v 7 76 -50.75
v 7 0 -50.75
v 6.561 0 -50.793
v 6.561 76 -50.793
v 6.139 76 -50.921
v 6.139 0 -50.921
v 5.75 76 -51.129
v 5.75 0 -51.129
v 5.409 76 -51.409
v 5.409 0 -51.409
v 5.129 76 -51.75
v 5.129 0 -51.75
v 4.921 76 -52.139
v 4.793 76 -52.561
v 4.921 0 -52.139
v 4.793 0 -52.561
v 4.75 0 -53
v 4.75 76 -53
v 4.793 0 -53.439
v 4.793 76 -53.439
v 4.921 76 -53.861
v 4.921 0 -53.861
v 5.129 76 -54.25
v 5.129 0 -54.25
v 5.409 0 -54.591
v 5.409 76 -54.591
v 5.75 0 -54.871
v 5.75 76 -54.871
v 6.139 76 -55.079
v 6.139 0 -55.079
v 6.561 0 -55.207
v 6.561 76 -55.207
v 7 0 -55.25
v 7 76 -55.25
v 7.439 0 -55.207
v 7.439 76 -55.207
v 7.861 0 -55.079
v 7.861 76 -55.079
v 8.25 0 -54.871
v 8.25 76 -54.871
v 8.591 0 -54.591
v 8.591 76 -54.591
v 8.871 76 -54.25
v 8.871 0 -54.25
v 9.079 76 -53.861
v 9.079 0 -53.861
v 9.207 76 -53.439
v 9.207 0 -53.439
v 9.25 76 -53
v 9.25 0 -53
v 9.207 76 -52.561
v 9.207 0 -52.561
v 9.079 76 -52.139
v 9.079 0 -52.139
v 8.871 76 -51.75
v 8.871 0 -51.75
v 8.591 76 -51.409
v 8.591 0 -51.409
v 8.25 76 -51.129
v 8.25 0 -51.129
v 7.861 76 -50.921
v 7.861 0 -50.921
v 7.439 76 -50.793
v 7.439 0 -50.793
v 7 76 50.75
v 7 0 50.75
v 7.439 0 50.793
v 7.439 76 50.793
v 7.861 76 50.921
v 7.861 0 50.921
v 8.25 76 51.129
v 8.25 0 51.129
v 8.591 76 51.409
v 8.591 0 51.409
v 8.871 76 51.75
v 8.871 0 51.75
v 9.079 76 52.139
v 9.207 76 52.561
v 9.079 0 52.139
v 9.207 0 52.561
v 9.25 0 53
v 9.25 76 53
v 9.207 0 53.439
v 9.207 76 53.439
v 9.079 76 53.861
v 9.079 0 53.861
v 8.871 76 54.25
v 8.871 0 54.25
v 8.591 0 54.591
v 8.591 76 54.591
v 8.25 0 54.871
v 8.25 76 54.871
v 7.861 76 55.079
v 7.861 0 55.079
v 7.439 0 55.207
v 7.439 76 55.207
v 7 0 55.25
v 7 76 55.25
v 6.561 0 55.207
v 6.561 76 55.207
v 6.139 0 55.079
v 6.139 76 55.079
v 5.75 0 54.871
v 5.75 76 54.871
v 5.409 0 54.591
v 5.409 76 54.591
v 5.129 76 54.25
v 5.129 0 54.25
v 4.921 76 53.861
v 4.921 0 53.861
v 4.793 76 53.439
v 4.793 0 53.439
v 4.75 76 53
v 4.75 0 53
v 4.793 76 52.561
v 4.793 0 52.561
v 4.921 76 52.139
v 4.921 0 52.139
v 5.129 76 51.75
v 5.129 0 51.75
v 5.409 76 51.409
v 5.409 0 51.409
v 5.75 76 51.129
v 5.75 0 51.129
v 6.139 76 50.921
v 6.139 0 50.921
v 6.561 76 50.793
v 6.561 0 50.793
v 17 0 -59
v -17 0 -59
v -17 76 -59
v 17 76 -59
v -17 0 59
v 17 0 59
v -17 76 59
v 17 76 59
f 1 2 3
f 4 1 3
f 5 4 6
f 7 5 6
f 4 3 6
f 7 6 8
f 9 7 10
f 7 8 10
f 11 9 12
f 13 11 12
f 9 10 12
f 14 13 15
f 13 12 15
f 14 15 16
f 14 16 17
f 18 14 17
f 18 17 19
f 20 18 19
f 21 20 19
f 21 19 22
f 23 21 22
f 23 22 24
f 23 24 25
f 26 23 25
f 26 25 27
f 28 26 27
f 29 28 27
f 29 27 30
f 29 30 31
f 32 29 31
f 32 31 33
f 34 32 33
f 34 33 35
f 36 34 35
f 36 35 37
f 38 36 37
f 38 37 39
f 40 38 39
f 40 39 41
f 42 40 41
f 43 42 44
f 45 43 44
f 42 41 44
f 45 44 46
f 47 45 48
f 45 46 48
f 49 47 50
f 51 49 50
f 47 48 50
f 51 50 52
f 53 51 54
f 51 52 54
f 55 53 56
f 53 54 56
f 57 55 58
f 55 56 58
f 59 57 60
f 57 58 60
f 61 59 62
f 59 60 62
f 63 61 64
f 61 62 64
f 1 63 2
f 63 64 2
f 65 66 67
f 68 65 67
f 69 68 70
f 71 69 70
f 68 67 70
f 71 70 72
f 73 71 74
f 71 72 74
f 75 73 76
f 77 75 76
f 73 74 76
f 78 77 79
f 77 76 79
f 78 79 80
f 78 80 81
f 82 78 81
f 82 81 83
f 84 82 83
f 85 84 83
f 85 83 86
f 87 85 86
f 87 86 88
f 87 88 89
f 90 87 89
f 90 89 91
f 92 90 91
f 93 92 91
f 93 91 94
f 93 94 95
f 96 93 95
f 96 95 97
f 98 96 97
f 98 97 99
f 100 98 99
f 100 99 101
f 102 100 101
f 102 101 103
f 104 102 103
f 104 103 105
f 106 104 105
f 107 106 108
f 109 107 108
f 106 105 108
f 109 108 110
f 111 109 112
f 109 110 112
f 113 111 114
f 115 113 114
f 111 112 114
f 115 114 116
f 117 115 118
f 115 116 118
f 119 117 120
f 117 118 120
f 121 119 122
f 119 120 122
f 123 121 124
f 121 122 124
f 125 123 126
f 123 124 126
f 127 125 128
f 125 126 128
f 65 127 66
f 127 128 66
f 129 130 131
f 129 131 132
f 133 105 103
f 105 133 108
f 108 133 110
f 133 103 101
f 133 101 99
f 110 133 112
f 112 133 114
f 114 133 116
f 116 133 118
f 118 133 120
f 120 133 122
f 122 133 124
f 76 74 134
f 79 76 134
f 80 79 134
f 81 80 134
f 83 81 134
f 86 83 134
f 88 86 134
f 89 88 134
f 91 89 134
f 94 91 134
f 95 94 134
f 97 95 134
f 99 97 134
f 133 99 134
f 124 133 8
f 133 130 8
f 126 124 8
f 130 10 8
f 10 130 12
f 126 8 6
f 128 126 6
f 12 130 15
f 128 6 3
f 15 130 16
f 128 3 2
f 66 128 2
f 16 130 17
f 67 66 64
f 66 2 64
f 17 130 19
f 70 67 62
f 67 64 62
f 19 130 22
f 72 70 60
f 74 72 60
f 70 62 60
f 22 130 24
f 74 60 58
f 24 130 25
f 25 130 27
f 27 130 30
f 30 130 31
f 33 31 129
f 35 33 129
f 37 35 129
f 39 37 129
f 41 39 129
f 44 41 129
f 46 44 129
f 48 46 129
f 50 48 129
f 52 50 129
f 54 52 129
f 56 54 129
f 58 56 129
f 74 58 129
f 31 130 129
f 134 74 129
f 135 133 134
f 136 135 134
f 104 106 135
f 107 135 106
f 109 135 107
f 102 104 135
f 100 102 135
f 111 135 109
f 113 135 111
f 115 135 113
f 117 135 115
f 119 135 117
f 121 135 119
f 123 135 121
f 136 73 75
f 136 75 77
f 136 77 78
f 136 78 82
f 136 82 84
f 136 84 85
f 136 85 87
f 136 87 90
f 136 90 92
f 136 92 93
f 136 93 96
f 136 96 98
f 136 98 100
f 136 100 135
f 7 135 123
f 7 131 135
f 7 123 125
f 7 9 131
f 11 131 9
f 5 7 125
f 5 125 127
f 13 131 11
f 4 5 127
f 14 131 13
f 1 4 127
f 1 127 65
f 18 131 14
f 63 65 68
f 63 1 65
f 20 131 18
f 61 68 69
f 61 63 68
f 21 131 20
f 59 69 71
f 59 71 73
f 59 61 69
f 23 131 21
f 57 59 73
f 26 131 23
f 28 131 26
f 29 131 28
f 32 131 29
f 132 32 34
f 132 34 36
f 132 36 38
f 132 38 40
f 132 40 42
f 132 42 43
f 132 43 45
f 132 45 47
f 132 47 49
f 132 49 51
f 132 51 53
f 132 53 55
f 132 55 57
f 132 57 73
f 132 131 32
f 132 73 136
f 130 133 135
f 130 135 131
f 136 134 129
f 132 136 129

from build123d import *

# Parameters (mm, degrees)
SKETCH_1_W          = 34
SKETCH_1_H          = 118
EXTRUDE_1_DEPTH     = 76
SKETCH_2_R          = 2.25
CUT_EXTRUDE_1_DEPTH = 98.703633505


with BuildPart() as part:
    # 草图1 → 凸台-拉伸1 (new body)
    with BuildSketch(Plane(origin=(0, 0, 0), x_dir=(1, 0, 0), z_dir=(0, 1, 0))):
        Rectangle(SKETCH_1_W, SKETCH_1_H)
    extrude(amount=EXTRUDE_1_DEPTH)

    # 草图2 → 切除-拉伸1 (cut, through all)
    with BuildSketch(Plane.XZ):
        with Locations(Location((7, 53, 0), (0, 0, 270))):
            Circle(SKETCH_2_R)
        with Locations(Location((7, -53, 0), (0, 0, 90))):
            Circle(SKETCH_2_R)
    extrude(amount=-CUT_EXTRUDE_1_DEPTH, mode=Mode.SUBTRACT)


solid = part.part
